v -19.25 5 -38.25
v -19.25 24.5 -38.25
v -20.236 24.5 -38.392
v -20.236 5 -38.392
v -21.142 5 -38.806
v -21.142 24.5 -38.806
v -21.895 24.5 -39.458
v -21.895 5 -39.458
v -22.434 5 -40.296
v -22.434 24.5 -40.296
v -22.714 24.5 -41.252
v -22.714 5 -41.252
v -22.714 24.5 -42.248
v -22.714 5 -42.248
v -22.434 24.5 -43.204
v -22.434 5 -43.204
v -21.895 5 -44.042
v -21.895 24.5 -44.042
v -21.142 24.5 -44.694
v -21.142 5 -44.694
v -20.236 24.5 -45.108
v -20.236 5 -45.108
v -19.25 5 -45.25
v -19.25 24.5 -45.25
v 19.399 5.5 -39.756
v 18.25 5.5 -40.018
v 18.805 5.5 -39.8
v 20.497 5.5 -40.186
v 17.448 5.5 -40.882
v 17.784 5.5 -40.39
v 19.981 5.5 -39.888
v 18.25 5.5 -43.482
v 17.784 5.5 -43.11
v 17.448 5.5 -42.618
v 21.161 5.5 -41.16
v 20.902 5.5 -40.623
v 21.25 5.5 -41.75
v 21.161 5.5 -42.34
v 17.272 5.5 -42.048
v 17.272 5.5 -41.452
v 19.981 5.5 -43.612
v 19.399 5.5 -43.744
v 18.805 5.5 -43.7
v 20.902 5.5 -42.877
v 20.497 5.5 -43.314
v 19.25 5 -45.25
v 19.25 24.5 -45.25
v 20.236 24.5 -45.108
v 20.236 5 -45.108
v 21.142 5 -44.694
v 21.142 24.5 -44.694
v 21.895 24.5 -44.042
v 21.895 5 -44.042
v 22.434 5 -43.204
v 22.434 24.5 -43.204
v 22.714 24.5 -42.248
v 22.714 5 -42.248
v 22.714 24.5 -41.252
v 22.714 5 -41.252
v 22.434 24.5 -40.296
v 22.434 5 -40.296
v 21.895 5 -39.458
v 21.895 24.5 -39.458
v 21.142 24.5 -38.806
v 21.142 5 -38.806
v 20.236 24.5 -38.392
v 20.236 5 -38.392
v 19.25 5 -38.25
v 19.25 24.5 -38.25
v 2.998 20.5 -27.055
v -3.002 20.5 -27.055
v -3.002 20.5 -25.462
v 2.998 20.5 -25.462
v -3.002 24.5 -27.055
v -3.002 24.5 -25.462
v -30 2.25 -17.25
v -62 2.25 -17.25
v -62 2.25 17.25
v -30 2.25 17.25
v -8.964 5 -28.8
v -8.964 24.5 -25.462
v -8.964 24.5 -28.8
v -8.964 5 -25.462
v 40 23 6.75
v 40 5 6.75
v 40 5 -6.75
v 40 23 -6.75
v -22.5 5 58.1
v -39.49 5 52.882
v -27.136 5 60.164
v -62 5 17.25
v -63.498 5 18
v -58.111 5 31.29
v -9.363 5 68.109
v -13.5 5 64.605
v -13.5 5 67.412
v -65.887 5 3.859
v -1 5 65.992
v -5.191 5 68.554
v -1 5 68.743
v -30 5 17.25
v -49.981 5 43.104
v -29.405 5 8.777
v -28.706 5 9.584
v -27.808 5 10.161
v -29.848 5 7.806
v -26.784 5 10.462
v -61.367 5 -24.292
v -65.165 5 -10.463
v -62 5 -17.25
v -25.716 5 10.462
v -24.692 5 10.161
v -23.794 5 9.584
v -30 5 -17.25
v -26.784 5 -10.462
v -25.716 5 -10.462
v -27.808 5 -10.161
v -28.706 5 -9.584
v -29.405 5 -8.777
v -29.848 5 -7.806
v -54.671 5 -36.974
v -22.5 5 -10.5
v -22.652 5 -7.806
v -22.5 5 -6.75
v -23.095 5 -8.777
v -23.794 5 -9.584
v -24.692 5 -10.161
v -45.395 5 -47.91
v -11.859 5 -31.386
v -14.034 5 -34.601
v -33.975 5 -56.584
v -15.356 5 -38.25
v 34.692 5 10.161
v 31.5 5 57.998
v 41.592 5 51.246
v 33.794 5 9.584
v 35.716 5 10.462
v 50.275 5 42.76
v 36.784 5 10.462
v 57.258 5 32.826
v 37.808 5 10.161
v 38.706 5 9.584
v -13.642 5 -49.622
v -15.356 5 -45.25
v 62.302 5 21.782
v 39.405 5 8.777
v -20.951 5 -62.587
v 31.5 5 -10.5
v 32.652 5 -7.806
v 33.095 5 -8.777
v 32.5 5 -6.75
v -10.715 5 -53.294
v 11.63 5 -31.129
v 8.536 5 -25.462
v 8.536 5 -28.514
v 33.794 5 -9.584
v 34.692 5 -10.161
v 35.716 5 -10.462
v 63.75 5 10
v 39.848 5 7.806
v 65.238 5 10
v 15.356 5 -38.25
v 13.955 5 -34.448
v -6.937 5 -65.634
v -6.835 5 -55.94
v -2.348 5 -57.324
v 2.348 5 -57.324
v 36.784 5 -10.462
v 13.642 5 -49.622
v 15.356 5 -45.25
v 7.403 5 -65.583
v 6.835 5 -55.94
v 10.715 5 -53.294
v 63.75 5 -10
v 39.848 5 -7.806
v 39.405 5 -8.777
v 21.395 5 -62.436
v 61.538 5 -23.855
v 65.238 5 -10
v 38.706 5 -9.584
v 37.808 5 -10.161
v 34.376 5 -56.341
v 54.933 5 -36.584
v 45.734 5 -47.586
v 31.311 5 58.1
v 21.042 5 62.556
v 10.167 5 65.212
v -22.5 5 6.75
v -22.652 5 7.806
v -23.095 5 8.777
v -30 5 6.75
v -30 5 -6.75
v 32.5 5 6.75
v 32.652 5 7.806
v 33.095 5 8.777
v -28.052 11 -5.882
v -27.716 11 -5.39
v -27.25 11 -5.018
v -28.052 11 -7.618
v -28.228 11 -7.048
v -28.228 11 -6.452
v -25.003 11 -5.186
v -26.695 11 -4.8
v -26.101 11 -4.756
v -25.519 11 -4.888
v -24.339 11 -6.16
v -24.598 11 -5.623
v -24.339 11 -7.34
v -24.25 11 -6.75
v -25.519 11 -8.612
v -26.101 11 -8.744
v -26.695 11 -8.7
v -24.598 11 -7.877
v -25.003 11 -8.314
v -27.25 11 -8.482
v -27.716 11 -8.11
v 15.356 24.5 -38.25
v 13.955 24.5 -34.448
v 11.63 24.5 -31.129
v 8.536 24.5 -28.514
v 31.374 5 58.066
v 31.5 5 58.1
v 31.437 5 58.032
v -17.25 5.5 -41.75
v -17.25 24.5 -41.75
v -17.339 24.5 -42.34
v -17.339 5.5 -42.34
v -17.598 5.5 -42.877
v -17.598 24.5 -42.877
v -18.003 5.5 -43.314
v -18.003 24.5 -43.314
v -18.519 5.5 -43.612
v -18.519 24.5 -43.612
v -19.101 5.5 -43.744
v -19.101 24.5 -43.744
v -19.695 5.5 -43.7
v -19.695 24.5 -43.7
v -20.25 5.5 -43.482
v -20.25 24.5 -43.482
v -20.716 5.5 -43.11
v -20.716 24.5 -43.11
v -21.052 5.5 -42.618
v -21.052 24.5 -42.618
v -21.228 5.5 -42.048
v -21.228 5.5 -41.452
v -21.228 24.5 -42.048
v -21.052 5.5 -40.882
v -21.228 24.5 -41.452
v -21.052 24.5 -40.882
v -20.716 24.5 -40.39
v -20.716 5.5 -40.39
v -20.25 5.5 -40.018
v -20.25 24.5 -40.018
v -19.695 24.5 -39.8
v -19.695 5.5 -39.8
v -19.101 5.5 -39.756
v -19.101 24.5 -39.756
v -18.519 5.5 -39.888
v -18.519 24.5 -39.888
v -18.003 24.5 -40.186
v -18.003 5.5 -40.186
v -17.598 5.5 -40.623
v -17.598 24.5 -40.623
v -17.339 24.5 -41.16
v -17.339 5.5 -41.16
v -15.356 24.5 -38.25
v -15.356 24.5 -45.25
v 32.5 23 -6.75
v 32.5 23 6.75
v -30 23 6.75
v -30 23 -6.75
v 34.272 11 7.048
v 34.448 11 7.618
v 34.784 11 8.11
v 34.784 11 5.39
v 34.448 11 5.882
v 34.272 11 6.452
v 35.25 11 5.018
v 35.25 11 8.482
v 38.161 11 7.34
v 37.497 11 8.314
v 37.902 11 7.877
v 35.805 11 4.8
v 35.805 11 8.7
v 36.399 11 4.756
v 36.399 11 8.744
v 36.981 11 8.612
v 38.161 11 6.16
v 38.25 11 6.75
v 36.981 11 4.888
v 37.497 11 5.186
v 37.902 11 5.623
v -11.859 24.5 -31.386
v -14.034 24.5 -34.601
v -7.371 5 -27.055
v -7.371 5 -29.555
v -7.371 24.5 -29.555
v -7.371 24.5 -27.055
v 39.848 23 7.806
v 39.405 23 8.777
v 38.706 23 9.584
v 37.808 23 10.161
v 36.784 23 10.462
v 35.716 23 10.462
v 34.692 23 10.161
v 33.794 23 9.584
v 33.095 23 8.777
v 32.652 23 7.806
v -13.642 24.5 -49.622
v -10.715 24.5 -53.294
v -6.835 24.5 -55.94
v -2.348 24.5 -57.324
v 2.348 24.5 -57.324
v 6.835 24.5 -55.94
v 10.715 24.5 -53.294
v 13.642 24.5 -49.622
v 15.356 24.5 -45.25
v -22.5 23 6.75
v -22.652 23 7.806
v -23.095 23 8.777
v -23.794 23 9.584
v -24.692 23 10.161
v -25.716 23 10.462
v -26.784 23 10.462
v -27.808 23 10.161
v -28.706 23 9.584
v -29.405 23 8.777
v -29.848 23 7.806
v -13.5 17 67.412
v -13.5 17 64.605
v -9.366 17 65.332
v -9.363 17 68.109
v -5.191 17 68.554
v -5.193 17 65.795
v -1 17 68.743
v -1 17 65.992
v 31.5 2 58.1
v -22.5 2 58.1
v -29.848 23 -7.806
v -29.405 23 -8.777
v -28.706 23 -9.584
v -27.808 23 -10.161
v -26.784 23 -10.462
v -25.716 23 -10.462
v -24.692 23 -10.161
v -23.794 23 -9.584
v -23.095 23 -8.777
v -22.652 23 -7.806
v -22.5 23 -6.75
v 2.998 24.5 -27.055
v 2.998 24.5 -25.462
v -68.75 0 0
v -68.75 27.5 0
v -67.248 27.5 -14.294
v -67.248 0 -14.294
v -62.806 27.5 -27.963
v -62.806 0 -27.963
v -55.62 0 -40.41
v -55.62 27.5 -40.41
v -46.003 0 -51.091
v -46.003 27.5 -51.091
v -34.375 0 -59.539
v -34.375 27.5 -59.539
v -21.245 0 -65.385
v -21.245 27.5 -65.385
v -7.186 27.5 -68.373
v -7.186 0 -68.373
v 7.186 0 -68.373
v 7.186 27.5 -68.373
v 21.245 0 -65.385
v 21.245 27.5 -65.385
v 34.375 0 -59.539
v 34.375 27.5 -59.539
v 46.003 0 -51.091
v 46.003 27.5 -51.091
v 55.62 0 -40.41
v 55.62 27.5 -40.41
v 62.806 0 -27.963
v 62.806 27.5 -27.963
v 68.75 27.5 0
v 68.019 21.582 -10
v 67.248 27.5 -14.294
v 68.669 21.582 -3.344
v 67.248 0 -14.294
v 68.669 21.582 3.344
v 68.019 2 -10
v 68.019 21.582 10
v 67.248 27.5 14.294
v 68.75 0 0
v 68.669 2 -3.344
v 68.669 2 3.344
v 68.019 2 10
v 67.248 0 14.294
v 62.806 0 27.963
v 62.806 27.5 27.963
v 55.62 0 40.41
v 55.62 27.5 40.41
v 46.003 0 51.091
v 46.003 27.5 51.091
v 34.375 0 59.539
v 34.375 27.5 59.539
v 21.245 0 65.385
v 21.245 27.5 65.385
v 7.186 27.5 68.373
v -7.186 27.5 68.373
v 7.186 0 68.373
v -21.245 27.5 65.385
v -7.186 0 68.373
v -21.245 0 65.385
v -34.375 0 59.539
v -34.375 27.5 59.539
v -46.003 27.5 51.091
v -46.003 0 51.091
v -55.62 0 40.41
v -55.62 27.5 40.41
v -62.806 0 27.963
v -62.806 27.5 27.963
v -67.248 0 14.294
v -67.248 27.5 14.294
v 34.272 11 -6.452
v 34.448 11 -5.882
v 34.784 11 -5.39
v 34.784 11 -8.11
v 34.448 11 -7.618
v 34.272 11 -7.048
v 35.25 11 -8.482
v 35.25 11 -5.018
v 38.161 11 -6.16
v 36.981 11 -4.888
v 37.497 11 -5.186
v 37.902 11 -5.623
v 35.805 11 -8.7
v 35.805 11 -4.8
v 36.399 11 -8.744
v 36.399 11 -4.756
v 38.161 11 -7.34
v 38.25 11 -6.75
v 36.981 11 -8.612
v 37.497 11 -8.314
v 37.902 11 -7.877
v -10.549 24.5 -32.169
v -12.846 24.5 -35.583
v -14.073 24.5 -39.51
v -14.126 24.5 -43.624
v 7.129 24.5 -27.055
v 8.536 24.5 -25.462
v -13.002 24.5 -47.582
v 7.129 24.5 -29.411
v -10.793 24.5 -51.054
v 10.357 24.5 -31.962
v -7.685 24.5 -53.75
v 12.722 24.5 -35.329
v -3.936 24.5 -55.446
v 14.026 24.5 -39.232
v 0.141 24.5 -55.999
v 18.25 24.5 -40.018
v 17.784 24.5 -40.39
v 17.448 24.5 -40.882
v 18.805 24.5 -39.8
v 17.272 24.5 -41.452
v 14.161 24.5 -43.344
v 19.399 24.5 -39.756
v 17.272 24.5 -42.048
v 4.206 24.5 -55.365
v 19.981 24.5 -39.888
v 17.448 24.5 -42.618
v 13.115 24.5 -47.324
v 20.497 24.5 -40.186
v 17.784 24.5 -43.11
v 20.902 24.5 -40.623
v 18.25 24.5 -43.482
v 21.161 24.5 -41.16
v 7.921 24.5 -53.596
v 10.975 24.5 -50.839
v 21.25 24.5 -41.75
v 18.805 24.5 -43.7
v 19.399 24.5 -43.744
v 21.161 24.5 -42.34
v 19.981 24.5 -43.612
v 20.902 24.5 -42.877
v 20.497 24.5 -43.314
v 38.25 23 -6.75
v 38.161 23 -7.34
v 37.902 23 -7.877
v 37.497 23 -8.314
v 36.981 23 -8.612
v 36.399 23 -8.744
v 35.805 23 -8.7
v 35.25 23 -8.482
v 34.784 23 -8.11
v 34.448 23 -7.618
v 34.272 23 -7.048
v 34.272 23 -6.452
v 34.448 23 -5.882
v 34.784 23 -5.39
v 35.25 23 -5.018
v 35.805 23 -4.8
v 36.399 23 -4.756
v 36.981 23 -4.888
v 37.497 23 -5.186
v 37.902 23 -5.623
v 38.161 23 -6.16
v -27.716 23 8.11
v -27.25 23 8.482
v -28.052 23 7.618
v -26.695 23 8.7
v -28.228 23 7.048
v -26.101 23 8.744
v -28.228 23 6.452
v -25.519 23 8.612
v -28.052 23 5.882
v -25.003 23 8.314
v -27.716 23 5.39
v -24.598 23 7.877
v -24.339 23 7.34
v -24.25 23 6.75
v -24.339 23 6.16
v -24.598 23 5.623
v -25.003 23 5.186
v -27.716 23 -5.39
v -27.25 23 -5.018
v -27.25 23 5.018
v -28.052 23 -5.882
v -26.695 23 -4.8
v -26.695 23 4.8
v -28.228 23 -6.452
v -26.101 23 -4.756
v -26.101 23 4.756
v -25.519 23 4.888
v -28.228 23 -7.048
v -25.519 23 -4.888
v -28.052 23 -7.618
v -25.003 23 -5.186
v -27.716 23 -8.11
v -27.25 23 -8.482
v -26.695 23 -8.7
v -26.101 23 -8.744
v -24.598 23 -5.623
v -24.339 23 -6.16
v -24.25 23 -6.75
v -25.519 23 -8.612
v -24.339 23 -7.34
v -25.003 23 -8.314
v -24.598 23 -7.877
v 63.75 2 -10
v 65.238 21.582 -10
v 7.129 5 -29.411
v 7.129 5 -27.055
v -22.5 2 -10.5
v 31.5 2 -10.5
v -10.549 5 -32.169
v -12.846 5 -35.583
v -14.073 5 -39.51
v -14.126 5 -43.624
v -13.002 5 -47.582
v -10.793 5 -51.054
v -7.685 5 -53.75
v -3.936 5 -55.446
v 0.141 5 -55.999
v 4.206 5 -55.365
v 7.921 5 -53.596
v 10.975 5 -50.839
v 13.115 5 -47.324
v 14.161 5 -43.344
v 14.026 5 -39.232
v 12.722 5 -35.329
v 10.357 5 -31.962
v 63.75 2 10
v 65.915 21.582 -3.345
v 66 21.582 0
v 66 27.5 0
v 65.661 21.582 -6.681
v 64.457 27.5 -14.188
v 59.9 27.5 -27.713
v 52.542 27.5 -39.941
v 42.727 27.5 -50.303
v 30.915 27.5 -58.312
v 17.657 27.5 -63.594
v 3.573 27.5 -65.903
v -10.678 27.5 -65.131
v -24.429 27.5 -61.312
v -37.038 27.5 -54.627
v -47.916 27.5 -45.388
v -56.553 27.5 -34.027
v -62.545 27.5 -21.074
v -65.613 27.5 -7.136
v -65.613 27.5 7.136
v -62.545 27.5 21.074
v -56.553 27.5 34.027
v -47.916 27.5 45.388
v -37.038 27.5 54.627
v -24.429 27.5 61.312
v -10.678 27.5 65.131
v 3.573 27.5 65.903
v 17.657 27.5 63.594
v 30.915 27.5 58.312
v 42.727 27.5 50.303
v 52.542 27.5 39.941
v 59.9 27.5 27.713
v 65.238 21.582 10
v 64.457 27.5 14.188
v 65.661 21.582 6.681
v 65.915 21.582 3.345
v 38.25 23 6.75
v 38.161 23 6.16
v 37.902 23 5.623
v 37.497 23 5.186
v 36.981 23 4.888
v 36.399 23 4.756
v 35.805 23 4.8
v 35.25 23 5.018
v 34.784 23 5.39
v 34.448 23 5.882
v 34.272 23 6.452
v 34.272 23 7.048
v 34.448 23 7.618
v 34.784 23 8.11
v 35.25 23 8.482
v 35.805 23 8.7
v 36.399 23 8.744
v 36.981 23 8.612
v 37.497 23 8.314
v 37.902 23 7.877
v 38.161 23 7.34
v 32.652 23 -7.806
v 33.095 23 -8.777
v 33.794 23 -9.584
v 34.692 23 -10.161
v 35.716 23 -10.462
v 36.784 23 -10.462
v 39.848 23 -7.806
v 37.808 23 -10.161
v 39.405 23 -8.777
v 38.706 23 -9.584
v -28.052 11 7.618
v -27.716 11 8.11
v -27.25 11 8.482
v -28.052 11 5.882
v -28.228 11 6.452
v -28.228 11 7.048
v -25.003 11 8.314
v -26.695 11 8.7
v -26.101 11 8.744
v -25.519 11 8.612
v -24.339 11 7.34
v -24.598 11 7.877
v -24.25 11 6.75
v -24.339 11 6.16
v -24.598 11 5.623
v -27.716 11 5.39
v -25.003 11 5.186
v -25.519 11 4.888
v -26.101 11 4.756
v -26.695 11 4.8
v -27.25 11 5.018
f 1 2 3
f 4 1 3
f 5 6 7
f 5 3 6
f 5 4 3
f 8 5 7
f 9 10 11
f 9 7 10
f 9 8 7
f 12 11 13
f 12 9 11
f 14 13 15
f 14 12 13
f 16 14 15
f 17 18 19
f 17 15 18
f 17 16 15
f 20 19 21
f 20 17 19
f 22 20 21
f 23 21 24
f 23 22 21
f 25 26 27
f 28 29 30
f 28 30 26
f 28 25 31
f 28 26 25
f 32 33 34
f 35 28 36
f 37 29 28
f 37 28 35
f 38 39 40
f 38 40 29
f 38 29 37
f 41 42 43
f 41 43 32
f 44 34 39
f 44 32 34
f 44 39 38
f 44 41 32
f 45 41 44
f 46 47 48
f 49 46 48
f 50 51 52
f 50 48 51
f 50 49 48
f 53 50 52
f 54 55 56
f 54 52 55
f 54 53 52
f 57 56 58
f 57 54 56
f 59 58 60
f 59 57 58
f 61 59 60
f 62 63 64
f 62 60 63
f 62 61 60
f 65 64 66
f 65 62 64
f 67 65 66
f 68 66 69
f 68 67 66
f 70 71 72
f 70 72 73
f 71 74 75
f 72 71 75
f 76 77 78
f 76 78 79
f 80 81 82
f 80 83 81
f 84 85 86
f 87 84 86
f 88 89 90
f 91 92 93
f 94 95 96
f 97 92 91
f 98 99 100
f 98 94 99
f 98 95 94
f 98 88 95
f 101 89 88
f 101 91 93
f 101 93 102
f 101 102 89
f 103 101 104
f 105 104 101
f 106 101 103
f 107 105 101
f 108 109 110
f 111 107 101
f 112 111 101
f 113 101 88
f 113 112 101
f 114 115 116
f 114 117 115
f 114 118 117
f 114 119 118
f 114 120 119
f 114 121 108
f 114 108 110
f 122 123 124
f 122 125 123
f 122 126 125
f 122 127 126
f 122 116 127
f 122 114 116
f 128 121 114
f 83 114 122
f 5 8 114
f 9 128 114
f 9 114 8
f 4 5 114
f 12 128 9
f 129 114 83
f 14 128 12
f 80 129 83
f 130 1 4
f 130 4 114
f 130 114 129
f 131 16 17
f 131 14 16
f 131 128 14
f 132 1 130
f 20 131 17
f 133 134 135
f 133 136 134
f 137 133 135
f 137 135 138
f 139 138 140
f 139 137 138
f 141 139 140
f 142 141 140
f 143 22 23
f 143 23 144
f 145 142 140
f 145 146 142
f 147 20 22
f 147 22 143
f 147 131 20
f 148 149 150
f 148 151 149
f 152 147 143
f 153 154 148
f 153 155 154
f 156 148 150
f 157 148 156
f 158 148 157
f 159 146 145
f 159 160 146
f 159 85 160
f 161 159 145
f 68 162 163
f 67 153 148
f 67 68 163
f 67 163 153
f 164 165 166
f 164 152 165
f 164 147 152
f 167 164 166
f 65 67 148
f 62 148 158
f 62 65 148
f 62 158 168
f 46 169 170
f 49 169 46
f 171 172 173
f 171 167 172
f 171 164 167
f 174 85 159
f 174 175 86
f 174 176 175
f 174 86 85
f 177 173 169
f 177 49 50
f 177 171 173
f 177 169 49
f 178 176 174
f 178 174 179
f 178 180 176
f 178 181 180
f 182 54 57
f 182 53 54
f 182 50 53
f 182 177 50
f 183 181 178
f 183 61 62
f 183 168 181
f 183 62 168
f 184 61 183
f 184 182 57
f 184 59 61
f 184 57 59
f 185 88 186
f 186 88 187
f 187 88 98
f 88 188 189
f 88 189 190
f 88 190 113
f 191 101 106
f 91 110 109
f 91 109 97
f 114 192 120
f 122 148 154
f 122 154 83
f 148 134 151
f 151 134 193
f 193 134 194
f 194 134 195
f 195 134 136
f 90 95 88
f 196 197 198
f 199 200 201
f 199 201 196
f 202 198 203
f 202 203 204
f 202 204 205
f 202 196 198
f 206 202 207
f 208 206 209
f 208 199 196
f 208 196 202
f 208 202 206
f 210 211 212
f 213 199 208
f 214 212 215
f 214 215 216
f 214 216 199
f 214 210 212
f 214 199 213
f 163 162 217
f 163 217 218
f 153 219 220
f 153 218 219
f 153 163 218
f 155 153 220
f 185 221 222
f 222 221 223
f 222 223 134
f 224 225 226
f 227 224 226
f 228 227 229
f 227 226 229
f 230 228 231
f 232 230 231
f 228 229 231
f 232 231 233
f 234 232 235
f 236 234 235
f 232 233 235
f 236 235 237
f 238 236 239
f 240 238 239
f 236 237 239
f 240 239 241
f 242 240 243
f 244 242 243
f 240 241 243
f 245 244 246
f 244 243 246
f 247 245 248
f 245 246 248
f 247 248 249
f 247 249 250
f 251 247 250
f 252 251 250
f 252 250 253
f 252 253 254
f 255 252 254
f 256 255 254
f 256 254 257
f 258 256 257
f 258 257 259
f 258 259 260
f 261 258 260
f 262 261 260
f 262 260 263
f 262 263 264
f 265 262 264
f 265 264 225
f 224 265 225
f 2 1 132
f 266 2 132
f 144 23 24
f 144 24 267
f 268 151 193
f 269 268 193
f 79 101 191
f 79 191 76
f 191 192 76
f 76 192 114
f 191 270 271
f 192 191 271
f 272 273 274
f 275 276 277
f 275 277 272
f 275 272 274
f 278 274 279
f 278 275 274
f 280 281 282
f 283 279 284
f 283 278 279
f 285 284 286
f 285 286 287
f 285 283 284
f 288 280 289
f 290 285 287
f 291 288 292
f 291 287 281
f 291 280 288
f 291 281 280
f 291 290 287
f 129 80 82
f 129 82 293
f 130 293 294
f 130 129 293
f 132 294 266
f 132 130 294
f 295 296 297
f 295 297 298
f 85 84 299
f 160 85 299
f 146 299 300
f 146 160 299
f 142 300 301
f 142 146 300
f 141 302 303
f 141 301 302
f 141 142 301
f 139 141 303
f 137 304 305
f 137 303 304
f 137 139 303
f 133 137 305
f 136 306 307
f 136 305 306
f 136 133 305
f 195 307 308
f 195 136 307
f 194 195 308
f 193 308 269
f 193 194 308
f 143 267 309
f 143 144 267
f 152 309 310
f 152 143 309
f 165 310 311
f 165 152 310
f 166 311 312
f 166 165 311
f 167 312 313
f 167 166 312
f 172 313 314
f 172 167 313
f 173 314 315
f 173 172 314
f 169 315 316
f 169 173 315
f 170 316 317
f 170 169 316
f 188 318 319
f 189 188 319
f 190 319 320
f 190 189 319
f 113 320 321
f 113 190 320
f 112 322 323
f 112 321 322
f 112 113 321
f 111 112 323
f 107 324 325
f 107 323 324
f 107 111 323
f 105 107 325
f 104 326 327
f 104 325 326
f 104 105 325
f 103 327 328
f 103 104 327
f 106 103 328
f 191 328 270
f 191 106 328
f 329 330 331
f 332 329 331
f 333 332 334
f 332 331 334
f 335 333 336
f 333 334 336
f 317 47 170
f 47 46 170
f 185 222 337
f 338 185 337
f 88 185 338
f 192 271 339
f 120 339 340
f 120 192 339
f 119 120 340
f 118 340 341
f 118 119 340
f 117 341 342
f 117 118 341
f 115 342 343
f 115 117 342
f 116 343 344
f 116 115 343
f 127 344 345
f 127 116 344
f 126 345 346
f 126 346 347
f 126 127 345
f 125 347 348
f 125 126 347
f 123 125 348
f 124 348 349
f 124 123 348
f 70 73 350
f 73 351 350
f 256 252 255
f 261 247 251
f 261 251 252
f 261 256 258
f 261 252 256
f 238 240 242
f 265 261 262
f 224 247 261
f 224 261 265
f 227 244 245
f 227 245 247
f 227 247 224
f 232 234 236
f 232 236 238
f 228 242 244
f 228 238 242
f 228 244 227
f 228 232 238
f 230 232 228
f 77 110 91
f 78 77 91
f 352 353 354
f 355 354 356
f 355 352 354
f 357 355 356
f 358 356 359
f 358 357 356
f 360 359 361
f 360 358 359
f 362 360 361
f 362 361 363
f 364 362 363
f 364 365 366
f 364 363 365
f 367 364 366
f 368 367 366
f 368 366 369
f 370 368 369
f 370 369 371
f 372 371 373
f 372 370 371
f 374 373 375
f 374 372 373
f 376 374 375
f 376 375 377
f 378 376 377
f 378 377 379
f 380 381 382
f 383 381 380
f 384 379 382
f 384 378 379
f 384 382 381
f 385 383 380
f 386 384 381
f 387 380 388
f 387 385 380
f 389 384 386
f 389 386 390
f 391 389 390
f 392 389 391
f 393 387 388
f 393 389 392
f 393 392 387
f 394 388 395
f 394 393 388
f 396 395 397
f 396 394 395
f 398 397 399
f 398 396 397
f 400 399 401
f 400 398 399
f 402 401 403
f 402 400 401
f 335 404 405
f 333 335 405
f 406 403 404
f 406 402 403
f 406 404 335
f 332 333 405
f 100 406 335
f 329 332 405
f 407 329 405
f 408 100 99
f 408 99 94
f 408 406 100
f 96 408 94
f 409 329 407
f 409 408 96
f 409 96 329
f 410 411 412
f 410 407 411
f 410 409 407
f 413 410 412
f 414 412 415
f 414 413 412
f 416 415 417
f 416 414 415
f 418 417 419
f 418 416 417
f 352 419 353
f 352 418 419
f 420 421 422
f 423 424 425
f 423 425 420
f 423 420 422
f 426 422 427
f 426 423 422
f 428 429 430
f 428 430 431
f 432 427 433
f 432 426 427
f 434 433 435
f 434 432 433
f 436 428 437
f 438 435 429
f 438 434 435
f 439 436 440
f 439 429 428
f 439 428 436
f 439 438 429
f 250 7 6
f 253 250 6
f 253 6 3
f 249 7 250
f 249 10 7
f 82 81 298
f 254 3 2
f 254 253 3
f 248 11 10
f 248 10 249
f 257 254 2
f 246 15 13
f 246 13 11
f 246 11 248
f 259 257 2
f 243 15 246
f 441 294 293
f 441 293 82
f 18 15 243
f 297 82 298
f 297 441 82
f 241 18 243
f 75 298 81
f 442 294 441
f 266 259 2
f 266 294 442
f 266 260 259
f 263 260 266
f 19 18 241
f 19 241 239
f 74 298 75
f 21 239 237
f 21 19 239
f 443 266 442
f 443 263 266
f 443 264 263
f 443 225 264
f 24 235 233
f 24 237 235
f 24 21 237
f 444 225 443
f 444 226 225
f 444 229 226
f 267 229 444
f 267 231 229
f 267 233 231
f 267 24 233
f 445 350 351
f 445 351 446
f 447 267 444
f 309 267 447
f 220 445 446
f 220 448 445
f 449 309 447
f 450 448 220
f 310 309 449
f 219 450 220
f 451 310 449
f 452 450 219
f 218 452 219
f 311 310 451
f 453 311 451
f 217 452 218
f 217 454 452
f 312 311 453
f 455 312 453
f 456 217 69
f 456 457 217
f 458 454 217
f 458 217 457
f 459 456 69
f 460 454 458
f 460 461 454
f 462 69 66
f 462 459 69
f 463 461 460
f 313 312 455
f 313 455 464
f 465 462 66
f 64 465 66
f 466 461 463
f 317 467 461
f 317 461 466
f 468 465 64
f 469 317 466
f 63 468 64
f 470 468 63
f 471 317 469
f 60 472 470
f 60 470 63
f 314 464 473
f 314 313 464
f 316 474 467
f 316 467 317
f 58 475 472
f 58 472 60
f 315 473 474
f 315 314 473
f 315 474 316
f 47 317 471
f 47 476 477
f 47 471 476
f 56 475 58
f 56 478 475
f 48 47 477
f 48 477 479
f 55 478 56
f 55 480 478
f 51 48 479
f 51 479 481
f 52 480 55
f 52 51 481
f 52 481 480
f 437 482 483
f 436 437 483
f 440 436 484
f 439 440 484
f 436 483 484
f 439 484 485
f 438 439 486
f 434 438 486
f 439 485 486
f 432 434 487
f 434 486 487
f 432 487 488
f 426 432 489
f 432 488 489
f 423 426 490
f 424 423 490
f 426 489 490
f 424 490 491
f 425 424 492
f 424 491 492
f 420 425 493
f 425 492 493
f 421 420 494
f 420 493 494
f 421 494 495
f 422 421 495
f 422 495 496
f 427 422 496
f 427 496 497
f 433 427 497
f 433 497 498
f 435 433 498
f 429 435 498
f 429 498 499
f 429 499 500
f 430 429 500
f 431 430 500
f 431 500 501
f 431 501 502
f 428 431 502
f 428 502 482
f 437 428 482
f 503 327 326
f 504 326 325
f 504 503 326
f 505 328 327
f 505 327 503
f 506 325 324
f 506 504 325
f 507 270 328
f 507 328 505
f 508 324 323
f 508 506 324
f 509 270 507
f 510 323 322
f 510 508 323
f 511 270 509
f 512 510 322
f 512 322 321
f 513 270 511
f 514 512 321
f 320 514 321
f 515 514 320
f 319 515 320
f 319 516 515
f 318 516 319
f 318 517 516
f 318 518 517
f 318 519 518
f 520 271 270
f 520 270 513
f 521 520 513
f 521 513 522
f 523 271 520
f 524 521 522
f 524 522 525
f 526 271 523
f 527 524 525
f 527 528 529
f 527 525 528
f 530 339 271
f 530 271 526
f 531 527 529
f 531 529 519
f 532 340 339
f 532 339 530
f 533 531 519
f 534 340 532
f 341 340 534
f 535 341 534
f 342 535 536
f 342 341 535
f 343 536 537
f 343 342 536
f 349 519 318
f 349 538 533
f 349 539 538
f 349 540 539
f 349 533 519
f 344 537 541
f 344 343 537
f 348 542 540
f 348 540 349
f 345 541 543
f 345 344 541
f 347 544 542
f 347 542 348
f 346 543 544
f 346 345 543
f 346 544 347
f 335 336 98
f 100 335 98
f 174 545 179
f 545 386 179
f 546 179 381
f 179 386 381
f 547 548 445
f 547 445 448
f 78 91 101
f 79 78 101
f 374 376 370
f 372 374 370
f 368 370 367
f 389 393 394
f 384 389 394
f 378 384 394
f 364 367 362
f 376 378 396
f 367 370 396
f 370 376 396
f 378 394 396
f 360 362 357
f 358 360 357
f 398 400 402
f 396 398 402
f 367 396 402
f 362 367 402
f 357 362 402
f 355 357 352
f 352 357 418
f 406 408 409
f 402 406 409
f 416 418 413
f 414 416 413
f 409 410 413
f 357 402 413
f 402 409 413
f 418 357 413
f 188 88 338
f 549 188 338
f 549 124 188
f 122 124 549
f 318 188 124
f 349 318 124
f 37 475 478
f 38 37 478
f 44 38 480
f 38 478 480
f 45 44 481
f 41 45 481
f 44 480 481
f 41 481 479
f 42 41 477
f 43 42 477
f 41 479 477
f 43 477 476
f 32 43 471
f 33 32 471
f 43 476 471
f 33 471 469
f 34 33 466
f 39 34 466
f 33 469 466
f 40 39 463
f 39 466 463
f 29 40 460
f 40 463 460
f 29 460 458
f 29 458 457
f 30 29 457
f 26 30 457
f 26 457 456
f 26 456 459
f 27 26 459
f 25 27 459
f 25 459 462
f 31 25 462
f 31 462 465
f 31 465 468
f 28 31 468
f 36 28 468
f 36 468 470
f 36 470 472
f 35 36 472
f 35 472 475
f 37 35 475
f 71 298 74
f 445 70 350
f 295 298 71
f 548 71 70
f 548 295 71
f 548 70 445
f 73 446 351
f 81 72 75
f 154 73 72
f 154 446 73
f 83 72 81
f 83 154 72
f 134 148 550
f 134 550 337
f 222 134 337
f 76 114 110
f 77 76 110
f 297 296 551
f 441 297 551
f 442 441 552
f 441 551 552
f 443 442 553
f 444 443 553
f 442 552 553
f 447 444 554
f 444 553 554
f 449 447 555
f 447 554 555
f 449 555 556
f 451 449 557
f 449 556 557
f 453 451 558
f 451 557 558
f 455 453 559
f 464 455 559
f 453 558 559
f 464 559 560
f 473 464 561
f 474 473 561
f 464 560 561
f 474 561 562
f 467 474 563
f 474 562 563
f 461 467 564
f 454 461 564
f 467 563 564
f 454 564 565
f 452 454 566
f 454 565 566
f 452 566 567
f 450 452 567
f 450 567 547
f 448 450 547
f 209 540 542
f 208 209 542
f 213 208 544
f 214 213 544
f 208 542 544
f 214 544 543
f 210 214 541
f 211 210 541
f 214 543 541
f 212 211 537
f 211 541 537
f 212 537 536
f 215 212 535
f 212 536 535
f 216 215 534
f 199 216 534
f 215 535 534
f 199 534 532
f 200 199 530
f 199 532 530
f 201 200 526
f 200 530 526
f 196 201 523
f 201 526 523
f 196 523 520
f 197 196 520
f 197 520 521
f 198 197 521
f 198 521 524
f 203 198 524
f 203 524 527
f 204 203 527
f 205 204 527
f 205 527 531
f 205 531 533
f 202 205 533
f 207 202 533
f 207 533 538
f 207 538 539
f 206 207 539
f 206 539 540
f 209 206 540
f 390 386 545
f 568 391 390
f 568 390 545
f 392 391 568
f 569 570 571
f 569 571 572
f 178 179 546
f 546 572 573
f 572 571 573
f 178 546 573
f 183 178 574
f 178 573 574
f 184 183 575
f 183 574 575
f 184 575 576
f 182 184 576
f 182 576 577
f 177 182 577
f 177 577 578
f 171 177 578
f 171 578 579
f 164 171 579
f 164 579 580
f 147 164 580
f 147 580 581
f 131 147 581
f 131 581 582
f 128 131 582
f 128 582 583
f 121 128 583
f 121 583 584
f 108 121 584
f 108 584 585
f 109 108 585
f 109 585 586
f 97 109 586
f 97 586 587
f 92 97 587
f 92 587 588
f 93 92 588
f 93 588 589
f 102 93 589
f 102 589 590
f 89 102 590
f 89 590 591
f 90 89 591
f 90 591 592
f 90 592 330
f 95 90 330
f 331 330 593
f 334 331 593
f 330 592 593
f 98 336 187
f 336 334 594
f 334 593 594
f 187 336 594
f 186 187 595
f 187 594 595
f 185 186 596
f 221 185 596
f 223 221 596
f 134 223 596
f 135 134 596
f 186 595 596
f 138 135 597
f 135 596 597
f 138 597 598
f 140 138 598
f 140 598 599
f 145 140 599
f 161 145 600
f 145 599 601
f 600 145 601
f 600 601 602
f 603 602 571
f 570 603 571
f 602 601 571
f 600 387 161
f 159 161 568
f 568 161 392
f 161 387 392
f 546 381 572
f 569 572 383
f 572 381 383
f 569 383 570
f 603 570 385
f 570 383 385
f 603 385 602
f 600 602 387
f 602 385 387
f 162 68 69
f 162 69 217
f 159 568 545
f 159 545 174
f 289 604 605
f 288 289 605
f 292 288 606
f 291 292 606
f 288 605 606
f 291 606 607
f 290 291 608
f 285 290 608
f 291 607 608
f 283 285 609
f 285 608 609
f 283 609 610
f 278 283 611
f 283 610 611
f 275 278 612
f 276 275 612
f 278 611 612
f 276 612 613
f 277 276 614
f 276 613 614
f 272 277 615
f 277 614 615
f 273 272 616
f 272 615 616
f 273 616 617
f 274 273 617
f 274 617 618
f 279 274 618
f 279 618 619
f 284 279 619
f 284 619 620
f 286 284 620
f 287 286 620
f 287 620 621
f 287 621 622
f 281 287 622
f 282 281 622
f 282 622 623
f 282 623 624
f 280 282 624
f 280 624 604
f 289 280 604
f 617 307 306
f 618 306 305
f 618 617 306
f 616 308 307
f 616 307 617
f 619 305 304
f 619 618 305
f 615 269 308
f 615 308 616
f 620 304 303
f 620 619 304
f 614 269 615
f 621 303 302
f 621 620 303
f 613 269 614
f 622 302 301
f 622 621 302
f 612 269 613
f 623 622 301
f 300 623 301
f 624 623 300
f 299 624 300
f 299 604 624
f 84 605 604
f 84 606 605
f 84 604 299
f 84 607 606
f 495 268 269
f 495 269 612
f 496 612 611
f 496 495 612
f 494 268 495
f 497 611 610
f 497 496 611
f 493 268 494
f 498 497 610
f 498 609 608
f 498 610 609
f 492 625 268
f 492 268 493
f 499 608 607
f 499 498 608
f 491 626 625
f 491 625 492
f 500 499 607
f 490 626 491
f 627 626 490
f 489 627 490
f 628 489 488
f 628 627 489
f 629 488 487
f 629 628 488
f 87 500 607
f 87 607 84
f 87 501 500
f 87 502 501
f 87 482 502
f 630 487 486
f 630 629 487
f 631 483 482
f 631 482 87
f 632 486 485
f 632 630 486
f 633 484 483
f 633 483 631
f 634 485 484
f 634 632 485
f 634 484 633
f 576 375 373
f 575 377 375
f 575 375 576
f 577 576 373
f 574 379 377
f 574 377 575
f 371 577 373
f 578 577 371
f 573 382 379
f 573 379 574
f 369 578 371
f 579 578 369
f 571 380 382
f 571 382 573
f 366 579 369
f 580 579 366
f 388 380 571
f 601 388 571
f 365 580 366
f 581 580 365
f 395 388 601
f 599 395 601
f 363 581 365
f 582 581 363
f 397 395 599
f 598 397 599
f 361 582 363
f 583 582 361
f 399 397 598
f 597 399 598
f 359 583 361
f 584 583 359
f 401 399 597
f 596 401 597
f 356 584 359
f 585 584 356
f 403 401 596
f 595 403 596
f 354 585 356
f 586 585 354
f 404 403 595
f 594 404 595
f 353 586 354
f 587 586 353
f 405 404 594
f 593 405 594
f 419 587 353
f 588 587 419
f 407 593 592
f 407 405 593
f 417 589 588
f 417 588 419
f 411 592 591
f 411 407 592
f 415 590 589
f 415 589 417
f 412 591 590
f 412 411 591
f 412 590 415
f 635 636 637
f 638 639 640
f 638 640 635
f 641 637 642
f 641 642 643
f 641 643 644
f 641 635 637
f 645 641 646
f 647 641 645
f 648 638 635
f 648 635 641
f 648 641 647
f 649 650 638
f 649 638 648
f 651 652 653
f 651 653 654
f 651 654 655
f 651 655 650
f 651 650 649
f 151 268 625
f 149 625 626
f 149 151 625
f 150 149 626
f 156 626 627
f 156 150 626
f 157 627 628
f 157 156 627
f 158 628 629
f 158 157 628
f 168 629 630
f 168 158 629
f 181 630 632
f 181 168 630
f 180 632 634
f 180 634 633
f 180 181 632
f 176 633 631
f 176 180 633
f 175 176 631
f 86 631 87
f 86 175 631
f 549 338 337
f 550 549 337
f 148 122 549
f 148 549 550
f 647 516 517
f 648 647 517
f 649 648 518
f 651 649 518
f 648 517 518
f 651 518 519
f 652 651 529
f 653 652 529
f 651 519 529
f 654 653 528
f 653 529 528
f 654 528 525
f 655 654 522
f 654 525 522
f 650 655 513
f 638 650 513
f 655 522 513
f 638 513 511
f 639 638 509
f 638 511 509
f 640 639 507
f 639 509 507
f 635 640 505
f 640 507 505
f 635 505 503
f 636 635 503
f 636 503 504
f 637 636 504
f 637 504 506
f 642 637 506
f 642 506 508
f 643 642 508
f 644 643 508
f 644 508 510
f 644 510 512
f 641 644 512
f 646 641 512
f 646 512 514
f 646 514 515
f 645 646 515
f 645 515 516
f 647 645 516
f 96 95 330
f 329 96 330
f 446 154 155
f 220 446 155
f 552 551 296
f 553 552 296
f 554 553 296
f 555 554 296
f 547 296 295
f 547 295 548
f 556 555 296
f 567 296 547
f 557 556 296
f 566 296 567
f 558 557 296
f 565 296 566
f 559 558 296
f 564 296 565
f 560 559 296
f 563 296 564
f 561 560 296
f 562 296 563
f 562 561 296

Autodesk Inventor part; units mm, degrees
sketch "Sketch1" plane through (0, 0, 0) normal (0, 1, 0) x (-1, 0, 0)
  circle A0 centre (0, 0) radius 68.75
  dimension "d0" = 137.5
extrude "Extrusion1" add sketch "Sketch1" along normal blind 27.5
sketch "Sketch2" plane through (0, 27.5, 0) normal (0, 1, 0) x (1, 0, 0)
  circle A0 centre (0, 0) radius 66
  dimension "d4" = 132
extrude "Extrusion2" cut sketch "Sketch2" against normal blind 22.5
sketch "Sketch3" plane through (0, 5, 0) normal (0, 1, 0) x (1, 0, 0)
  circle A0 centre (0, 0) radius 68.75 projected
  line L0 (0, 68.75) -> (0, 41.75)
  arc A1 (7.1286, 29.4112) -> (-7.3714, 29.5547) centre (0, 41.75) ccw
  line L1 (8.5358, 25.4622) -> (-8.9642, 25.4622)
  line L2 (8.5358, 25.4622) -> (8.5358, 28.5136)
  line L3 (-8.9642, 25.4622) -> (-8.9642, 28.7999)
  line L4 (-7.3714, 29.5547) -> (-7.3714, 27.0547)
  line L5 (-7.3714, 27.0547) -> (7.1286, 27.0547)
  line L6 (7.1286, 27.0547) -> (7.1286, 29.4112)
  arc A2 (19.25, 38.25) -> (19.25, 45.25) centre (19.25, 41.75) ccw
  line L7 (19.25, 45.25) -> (15.3562, 45.25)
  line L8 (19.25, 38.25) -> (15.3562, 38.25)
  arc A3 (-19.25, 45.25) -> (-19.25, 38.25) centre (-19.25, 41.75) ccw
  line L9 (-19.25, 45.25) -> (-15.3562, 45.25)
  line L10 (-19.25, 38.25) -> (-15.3562, 38.25)
  arc A4 (-15.3562, 38.25) -> (-8.9642, 28.7999) centre (0, 41.75) ccw
  arc A5 (8.5358, 28.5136) -> (15.3562, 38.25) centre (0, 41.75) ccw
  arc A6 (15.3562, 45.25) -> (-15.3562, 45.25) centre (0, 41.75) ccw
  dimension "d7" = 27
  dimension "d8" = 28.5
  dimension "d12" = 17.5
  dimension "d14" = 2.5
  dimension "d15" = 14.5
extrude "Extrusion3" add sketch "Sketch3" along normal blind 19.5 contours A6 L7 A2 L8 A5 L2 L1 L3 A4 L10 A3 L9
sketch "Sketch4" plane through (0, 24.5, 0) normal (0, 1, 0) x (1, 0, 0)
  line L0 (-8.9642, 25.4622) -> (8.5358, 25.4622) projected
  line L1 (-0.002, 25.4622) -> (2.998, 25.4622)
  line L2 (2.998, 25.4622) -> (2.998, 27.0547)
  line L3 (2.998, 27.0547) -> (-3.002, 27.0547)
  line L4 (7.1286, 27.0547) -> (-7.3714, 27.0547) projected
  line L5 (-3.002, 27.0547) -> (-3.002, 25.4622)
  line L6 (-3.002, 25.4622) -> (-0.002, 25.4622)
  point P0 (0, 0)
  dimension "d18" = 3
  dimension "d19" = 6
extrude "Extrusion4" cut sketch "Sketch4" against normal blind 4
sketch "Sketch5" plane through (0, 24.5, 0) normal (0, 1, 0) x (1, 0, 0)
  arc A0 (-19.25, 45.25) -> (-19.25, 38.25) centre (-19.25, 41.75) ccw projected
  circle A1 centre (-19.25, 41.75) radius 2
  arc A2 (19.25, 38.25) -> (19.25, 45.25) centre (19.25, 41.75) ccw projected
  circle A3 centre (19.25, 41.75) radius 2
  point P0 (0, 0)
  dimension "d24" = 4
  dimension "d25" = 4
extrude "Extrusion5" cut sketch "Sketch5" against normal blind 19
sketch "Sketch6" plane through (0, 5, 0) normal (0, 1, 0) x (1, 0, 0)
  line L0 (-30, 0) -> (-30, 17.25)
  line L1 (-30, 17.25) -> (-62, 17.25)
  line L2 (-62, 17.25) -> (-62, -17.25)
  line L3 (-62, -17.25) -> (-30, -17.25)
  line L4 (-30, -17.25) -> (-30, 0)
  point P0 (0, 0)
  dimension "d28" = 30
  dimension "d29" = 17.25
  dimension "d30" = 32
  dimension "d31" = 90
  dimension "d32" = 34.5
extrude "Extrusion6" cut sketch "Sketch6" against normal blind 2.75
sketch "Sketch7" plane through (0, 5, 0) normal (0, 1, 0) x (1, 0, 0)
  line L0 (-30, 17.25) -> (-30, -17.25) projected
  line L1 (-30, 0) -> (-26.25, 0)
  line L2 (-26.25, 0) -> (-26.25, 10.5)
  line L3 (-26.25, 10.5) -> (-26.25, -10.5) construction
  line L4 (-22.5, 6.75) -> (-22.5, -6.75)
  line L5 (-30, -6.75) -> (-30, 6.75)
  arc A0 (-22.5, 6.75) -> (-30, 6.75) centre (-26.25, 6.75) ccw
  arc A1 (-30, -6.75) -> (-22.5, -6.75) centre (-26.25, -6.75) ccw
  line L6 (-26.25, 0) -> (36.25, 0)
  line L7 (36.25, 0) -> (36.25, 10.5)
  line L8 (36.25, 10.5) -> (36.25, -10.5) construction
  line L9 (32.5, 6.75) -> (32.5, -6.75)
  line L10 (40, -6.75) -> (40, 6.75)
  arc A2 (40, 6.75) -> (32.5, 6.75) centre (36.25, 6.75) ccw
  arc A3 (32.5, -6.75) -> (40, -6.75) centre (36.25, -6.75) ccw
  line L11 (36.25, 10.5) -> (57.25, 10.5) construction
  point P0 (0, 0)
  dimension "d36" = 3.75
  dimension "d37" = 10.5
  dimension "d38" = 21
  dimension "d39" = 62.5
  dimension "d40" = 10.5
  dimension "d41" = 21
  dimension "d42" = 90
  dimension "d43" = 7.5
extrude "Extrusion7" add sketch "Sketch7" along normal blind 18
sketch "Sketch8" plane through (0, 5, 0) normal (0, 1, 0) x (1, 0, 0)
  line L0 (-22.5, 6.75) -> (-22.5, -6.75) projected
  line L1 (-22.5, 0) -> (-22.5, 10.5)
  line L2 (-22.5, 10.5) -> (31.5, 10.5)
  line L3 (31.5, 10.5) -> (31.5, -58.1)
  line L4 (31.5, -58.1) -> (-22.5, -58.1)
  line L5 (-22.5, -58.1) -> (-22.5, 10.5)
  point P0 (0, 0)
  dimension "d46" = 10.5
  dimension "d47" = 54
  dimension "d48" = 68.6
extrude "Extrusion8" cut sketch "Sketch8" against normal blind 3
ref_plane "Work Plane1" through (-22.5, 2, 58.1) normal (0, 0, -1) x (-1, 0, 0)
sketch "Sketch9" plane through (-22.5, 2, 58.1) normal (0, 0, -1) x (-1, 0, 0)
  line L0 (-53.8112, 3) -> (0, 3) projected
  line L1 (0, 3) -> (-9, 3)
  line L2 (-9, 3) -> (-9, 15)
  line L3 (-9, 15) -> (-21.5, 15)
  line L4 (-21.5, 15) -> (-21.5, 3)
  line L5 (-21.5, 3) -> (-9, 3)
  line L6 (-54, 0) -> (0, 0) projected
  point P0 (-22.5, -2)
  dimension "d52" = 12
  dimension "d53" = 12.5
extrude "Extrusion9" cut sketch "Sketch9" against normal blind 102
ref_plane "Work Plane2" through (68.75, 0, 0) normal (1, 0, 0) x (0, 1, 0)
sketch "Sketch10" plane through (68.75, 0, 0) normal (1, 0, 0) x (0, 1, 0)
  line L0 (0, -68.75) -> (0, 68.75) projected
  line L1 (0, 0) -> (2, 0)
  line L2 (1.5818, 0) -> (1.5818, -10)
  line L3 (1.5818, -10) -> (21.5818, -10)
  line L4 (21.5818, -10) -> (21.5818, 10)
  line L5 (5, 10.5) -> (23, 10.5) projected
  line L6 (21.5818, 10) -> (1.5818, 10)
  line L7 (1.5818, 10) -> (1.5818, 0)
  line L8 (2, -10.5) -> (2, 58.1) projected
  point P0 (2, 10)
  point P1 (2, -10)
  dimension "d64" = 10
  dimension "d65" = 20
  dimension "d66" = 20
  dimension "d67" = 20
extrude "Extrusion10" cut sketch "Sketch10" against normal blind 5 contours L8 L6 L4 L3
sketch "Sketch11" plane through (0, 23, 0) normal (0, 1, 0) x (1, 0, 0)
  arc A0 (40, 6.75) -> (32.5, 6.75) centre (36.25, 6.75) ccw projected
  circle A1 centre (36.25, 6.75) radius 2
  arc A2 (32.5, -6.75) -> (40, -6.75) centre (36.25, -6.75) ccw projected
  circle A3 centre (36.25, -6.75) radius 2
  arc A4 (-22.5, 6.75) -> (-30, 6.75) centre (-26.25, 6.75) ccw projected
  circle A5 centre (-26.25, 6.75) radius 2
  arc A6 (-30, -6.75) -> (-22.5, -6.75) centre (-26.25, -6.75) ccw projected
  circle A7 centre (-26.25, -6.75) radius 2
  point P0 (0, 0)
  dimension "d70" = 4
  dimension "d71" = 4
  dimension "d72" = 4
  dimension "d73" = 4
extrude "Extrusion11" cut sketch "Sketch11" against normal blind 12
properties part number "gehäuse_scan"
